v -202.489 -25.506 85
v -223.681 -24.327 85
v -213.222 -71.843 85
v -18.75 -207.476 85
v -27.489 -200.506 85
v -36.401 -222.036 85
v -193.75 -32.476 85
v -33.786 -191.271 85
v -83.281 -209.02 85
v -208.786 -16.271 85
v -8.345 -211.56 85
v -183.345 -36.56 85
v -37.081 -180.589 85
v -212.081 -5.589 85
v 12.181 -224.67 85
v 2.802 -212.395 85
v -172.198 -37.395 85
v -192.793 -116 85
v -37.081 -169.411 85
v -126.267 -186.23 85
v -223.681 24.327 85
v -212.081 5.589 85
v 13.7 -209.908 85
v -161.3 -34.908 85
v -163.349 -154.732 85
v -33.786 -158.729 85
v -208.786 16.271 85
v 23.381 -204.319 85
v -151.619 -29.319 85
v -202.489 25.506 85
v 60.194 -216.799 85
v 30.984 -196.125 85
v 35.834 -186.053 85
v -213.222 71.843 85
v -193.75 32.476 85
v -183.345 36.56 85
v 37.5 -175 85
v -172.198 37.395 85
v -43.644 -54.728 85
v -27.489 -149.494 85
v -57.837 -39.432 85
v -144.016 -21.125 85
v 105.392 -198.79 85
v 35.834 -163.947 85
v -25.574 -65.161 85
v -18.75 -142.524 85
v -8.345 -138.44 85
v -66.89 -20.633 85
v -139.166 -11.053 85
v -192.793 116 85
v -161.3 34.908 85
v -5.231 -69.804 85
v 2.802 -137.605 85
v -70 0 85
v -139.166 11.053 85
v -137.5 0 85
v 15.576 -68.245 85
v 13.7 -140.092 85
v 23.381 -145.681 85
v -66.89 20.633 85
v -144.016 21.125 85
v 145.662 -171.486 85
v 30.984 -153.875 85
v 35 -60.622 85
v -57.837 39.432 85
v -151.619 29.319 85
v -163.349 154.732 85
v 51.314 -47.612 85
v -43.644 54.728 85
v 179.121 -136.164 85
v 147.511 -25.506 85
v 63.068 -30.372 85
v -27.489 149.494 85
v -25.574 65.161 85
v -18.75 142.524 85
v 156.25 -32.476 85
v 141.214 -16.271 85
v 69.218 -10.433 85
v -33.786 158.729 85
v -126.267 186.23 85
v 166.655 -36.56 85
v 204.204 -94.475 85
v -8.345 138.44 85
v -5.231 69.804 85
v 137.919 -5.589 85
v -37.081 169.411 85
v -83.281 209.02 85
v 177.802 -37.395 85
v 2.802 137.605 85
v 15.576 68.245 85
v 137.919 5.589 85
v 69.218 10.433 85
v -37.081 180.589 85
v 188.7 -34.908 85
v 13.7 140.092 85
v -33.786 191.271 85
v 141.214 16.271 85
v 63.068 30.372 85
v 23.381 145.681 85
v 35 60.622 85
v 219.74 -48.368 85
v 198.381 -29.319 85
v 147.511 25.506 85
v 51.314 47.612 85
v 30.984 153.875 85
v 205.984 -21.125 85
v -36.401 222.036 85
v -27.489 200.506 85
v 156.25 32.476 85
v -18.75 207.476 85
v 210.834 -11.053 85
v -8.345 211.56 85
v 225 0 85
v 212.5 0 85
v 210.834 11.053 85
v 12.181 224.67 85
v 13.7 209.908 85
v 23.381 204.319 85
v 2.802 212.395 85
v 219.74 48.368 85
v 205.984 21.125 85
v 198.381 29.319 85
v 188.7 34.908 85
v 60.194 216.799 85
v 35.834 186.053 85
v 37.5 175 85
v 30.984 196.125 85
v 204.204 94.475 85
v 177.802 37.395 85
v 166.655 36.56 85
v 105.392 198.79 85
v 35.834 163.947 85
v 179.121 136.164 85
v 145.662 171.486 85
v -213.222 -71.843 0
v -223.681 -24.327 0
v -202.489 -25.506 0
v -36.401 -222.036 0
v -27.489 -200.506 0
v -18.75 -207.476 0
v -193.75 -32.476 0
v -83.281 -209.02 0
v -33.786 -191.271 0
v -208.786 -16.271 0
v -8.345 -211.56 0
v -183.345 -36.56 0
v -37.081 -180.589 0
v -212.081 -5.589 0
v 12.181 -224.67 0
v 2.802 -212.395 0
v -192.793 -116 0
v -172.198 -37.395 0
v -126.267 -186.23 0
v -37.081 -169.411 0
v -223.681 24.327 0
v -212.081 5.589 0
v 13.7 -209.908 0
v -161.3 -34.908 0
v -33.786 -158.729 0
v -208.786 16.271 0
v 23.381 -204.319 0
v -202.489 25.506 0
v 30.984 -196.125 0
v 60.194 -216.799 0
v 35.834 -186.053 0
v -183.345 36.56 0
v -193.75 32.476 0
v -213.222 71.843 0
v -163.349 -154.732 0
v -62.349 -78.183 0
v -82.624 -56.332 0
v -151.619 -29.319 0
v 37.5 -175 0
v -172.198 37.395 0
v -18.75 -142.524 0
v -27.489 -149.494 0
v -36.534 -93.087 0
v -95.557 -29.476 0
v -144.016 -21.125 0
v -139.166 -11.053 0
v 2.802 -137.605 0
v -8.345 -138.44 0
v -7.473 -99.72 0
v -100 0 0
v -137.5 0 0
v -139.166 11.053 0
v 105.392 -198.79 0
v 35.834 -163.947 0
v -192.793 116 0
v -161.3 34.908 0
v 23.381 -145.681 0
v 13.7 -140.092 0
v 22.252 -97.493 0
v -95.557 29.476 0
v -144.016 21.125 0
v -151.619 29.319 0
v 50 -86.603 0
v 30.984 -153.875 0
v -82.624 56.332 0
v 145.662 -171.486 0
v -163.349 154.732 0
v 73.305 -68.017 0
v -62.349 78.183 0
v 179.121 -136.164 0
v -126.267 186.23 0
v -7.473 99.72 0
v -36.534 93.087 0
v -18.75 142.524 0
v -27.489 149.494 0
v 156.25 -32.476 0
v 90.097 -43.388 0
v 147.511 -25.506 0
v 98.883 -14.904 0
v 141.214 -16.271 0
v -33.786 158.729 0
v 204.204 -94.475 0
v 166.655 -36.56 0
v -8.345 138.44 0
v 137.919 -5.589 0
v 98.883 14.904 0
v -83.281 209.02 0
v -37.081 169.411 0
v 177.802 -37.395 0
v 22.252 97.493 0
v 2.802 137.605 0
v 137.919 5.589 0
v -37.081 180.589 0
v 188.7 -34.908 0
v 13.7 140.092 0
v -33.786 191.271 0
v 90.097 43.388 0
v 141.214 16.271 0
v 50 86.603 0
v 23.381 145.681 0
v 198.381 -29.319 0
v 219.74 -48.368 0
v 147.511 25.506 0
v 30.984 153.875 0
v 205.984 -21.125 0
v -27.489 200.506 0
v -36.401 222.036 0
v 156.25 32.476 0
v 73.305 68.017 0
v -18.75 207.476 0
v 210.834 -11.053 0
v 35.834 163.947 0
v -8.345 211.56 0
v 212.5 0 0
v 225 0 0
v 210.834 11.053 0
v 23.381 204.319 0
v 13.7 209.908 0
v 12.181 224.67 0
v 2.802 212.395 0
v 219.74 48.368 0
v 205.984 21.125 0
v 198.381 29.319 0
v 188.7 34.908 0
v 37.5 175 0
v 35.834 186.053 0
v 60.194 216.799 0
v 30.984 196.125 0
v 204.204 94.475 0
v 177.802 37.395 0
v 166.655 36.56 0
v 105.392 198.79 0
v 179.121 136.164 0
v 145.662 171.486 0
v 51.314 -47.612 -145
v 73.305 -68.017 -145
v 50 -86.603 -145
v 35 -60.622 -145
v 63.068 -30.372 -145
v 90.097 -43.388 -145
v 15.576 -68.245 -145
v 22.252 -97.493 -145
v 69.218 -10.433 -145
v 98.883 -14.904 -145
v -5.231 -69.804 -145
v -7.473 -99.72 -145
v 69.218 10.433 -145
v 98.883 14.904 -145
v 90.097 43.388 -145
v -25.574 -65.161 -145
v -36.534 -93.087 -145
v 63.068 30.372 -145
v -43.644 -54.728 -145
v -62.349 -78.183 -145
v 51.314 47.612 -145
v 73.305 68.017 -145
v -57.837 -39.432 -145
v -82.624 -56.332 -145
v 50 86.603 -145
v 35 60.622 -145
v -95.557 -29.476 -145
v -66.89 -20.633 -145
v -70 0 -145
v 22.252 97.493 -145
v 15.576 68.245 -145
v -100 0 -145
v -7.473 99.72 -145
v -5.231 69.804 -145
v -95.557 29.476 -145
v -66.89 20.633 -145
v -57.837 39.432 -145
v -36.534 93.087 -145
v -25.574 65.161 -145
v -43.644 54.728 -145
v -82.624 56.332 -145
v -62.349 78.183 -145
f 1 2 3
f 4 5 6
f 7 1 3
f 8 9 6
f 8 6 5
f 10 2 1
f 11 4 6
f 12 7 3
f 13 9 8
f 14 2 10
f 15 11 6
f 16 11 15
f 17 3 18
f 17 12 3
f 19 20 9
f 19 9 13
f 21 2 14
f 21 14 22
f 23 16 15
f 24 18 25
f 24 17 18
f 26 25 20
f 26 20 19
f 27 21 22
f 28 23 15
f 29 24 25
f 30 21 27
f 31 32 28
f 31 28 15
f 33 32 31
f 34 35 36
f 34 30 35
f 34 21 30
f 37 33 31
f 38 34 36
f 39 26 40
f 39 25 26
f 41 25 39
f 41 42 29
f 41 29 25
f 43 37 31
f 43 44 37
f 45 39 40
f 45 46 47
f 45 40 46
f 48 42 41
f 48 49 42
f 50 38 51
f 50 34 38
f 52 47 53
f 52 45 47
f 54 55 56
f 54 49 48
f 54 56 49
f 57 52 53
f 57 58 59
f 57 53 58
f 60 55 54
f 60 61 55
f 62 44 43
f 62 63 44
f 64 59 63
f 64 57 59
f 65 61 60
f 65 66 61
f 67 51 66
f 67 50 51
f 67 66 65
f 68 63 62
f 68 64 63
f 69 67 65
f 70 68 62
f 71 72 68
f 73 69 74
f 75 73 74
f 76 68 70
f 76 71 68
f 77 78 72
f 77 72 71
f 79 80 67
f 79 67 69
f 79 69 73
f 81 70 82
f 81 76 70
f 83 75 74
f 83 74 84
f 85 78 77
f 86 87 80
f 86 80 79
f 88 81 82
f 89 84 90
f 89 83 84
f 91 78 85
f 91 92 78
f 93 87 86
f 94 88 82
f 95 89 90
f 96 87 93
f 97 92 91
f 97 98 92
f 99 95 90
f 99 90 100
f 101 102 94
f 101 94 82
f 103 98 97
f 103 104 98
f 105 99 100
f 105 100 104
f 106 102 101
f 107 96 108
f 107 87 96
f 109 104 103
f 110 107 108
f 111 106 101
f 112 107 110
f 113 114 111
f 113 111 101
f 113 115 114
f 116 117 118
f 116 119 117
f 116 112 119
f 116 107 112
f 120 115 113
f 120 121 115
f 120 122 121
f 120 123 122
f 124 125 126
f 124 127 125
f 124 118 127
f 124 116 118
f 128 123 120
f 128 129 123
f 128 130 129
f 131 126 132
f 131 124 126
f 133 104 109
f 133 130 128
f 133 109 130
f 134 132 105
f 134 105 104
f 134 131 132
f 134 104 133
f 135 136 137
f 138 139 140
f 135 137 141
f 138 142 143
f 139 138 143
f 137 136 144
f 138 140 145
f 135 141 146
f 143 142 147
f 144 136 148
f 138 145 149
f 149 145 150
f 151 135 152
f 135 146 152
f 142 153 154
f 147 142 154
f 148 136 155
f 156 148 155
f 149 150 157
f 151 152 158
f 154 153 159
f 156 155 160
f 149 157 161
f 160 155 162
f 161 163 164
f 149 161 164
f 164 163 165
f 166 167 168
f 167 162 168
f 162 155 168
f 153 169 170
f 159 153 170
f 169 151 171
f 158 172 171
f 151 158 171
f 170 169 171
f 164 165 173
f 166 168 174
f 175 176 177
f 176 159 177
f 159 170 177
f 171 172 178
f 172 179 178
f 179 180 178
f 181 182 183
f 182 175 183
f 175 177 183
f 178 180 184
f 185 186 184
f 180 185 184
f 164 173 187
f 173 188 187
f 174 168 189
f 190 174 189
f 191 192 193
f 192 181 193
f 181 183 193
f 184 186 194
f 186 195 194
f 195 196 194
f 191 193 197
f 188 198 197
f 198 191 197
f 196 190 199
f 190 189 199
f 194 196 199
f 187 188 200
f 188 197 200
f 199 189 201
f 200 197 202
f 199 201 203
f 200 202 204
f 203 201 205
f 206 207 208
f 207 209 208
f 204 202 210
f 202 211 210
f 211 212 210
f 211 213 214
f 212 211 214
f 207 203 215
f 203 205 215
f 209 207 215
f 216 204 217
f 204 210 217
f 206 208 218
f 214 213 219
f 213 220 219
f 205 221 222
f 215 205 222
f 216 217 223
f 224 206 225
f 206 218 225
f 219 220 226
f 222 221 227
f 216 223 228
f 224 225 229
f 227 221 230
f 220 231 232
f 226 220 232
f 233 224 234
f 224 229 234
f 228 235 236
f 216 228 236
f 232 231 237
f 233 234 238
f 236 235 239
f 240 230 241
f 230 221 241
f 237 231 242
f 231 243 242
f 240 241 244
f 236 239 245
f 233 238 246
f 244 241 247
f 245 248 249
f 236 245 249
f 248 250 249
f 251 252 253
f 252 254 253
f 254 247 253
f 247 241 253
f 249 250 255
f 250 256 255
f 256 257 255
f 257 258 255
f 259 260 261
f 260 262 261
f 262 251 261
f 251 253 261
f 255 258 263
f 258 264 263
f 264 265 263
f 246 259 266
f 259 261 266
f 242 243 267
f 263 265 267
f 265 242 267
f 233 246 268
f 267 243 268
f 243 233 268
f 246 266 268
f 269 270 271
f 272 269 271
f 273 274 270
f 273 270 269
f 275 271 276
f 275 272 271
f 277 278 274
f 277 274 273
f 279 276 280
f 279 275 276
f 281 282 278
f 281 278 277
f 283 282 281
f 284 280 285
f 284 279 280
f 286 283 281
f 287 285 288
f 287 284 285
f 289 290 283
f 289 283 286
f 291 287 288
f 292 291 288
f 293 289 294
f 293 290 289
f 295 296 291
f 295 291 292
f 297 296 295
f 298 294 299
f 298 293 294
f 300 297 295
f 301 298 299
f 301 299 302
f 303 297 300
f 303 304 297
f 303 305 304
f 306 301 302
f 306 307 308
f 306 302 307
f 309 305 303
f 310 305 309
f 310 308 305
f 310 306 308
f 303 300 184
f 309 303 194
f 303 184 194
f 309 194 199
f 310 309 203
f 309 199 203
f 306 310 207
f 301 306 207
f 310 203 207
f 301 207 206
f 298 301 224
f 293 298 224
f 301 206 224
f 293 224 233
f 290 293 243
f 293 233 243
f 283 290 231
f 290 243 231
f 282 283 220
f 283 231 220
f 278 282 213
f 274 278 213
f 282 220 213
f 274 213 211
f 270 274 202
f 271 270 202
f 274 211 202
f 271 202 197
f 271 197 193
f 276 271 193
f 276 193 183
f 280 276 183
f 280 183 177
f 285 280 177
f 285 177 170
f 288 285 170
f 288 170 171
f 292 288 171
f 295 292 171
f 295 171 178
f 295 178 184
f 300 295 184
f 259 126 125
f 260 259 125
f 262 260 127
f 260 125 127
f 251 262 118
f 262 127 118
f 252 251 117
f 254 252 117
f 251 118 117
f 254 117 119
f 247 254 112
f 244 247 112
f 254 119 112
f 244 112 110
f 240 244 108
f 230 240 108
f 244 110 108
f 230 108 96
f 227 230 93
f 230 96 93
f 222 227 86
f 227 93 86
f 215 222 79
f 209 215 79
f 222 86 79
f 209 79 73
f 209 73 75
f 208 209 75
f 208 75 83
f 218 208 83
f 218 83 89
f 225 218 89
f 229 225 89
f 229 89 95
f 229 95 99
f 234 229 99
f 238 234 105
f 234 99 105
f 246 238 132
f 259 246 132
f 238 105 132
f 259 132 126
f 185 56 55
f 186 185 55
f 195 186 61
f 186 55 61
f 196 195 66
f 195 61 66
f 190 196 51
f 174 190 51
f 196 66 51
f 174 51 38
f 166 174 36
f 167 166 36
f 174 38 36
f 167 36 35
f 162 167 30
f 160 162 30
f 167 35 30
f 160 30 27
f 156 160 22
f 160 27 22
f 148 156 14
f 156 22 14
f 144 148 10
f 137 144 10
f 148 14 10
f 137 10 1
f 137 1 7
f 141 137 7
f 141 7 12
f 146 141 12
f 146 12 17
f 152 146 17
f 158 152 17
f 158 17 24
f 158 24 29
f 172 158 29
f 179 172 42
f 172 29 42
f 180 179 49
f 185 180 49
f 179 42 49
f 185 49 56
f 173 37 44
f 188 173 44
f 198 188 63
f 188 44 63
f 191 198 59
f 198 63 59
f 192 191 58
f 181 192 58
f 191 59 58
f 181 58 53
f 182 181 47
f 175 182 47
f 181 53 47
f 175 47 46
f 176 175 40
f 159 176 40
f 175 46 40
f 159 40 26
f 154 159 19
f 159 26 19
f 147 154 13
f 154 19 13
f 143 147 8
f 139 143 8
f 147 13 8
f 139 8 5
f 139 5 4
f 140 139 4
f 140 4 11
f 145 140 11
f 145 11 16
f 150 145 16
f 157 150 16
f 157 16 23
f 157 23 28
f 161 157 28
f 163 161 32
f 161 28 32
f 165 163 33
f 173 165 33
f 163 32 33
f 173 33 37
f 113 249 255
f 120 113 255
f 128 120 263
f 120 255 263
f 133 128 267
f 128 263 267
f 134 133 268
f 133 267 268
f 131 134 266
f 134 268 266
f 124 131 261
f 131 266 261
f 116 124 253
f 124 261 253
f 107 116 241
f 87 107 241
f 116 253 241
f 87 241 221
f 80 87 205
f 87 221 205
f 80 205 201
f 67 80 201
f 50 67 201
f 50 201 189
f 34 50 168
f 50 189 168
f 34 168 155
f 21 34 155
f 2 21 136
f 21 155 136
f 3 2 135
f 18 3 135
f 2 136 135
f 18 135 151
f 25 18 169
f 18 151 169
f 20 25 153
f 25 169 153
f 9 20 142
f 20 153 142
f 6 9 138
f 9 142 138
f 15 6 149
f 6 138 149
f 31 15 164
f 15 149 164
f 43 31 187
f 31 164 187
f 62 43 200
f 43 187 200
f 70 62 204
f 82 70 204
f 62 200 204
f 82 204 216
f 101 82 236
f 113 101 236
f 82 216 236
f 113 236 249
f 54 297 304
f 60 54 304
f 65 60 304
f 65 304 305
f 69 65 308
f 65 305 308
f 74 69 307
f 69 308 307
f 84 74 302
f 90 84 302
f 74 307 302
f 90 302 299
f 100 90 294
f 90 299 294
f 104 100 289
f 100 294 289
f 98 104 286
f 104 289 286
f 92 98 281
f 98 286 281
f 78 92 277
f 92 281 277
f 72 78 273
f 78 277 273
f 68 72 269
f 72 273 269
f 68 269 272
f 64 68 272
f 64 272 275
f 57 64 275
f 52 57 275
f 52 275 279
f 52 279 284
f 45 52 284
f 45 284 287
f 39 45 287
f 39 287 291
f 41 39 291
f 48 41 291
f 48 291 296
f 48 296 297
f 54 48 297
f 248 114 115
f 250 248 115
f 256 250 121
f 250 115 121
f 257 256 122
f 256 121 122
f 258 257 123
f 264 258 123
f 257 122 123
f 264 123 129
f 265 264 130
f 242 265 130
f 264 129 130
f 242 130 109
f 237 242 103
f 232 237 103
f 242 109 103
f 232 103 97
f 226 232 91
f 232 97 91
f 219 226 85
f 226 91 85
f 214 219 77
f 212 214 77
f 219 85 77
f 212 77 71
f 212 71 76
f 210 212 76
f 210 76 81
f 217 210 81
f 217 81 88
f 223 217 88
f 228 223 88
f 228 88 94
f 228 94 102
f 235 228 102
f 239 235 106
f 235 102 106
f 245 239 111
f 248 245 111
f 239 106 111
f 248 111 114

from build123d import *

# Parameters (mm, degrees)
SKETCH2_R                = 225
SKETCH2_R_2              = 100
BOSS_EXTRUDE1_DEPTH      = 85
BOSS_EXTRUDE2_DEPTH      = 145
BOSS_EXTRUDE2_DEPTH_BACK = 85
SKETCH3_R                = 100
SKETCH4_R                = 70
CUT_EXTRUDE1_DEPTH       = 315
SKETCH5_R                = 37.5
CUT_EXTRUDE2_DEPTH       = 85


with BuildPart() as part:
    # Sketch2 → Boss-Extrude1 (new body)
    with BuildSketch(Plane.XY):
        Circle(SKETCH2_R)
        Circle(SKETCH2_R_2, mode=Mode.SUBTRACT)
    extrude(amount=BOSS_EXTRUDE1_DEPTH)

    # Sketch3 → Boss-Extrude2 (add, two sides: drawn at the far end of the back side and taken through both)
    with BuildSketch(Plane(origin=(0, 0, 0), x_dir=(-1, 0, 0), z_dir=(0, 0, -1)).offset(-BOSS_EXTRUDE2_DEPTH_BACK)):
        Circle(SKETCH3_R)
    extrude(amount=BOSS_EXTRUDE2_DEPTH + BOSS_EXTRUDE2_DEPTH_BACK)

    # Sketch4 → Cut-Extrude1 (cut)
    with BuildSketch(Plane(origin=(0, 0, -145), x_dir=(-1, 0, 0), z_dir=(0, 0, -1))):
        Circle(SKETCH4_R)
    extrude(amount=-CUT_EXTRUDE1_DEPTH, mode=Mode.SUBTRACT)

    # Sketch5 → Cut-Extrude2 (cut)
    with BuildSketch(Plane.XY.offset(85)):
        with Locations((175, 0)):
            Circle(SKETCH5_R)
        with Locations((0, 175)):
            Circle(SKETCH5_R)
        with Locations((-175, 0)):
            Circle(SKETCH5_R)
        with Locations((0, -175)):
            Circle(SKETCH5_R)
    extrude(amount=-CUT_EXTRUDE2_DEPTH, mode=Mode.SUBTRACT)


solid = part.part
